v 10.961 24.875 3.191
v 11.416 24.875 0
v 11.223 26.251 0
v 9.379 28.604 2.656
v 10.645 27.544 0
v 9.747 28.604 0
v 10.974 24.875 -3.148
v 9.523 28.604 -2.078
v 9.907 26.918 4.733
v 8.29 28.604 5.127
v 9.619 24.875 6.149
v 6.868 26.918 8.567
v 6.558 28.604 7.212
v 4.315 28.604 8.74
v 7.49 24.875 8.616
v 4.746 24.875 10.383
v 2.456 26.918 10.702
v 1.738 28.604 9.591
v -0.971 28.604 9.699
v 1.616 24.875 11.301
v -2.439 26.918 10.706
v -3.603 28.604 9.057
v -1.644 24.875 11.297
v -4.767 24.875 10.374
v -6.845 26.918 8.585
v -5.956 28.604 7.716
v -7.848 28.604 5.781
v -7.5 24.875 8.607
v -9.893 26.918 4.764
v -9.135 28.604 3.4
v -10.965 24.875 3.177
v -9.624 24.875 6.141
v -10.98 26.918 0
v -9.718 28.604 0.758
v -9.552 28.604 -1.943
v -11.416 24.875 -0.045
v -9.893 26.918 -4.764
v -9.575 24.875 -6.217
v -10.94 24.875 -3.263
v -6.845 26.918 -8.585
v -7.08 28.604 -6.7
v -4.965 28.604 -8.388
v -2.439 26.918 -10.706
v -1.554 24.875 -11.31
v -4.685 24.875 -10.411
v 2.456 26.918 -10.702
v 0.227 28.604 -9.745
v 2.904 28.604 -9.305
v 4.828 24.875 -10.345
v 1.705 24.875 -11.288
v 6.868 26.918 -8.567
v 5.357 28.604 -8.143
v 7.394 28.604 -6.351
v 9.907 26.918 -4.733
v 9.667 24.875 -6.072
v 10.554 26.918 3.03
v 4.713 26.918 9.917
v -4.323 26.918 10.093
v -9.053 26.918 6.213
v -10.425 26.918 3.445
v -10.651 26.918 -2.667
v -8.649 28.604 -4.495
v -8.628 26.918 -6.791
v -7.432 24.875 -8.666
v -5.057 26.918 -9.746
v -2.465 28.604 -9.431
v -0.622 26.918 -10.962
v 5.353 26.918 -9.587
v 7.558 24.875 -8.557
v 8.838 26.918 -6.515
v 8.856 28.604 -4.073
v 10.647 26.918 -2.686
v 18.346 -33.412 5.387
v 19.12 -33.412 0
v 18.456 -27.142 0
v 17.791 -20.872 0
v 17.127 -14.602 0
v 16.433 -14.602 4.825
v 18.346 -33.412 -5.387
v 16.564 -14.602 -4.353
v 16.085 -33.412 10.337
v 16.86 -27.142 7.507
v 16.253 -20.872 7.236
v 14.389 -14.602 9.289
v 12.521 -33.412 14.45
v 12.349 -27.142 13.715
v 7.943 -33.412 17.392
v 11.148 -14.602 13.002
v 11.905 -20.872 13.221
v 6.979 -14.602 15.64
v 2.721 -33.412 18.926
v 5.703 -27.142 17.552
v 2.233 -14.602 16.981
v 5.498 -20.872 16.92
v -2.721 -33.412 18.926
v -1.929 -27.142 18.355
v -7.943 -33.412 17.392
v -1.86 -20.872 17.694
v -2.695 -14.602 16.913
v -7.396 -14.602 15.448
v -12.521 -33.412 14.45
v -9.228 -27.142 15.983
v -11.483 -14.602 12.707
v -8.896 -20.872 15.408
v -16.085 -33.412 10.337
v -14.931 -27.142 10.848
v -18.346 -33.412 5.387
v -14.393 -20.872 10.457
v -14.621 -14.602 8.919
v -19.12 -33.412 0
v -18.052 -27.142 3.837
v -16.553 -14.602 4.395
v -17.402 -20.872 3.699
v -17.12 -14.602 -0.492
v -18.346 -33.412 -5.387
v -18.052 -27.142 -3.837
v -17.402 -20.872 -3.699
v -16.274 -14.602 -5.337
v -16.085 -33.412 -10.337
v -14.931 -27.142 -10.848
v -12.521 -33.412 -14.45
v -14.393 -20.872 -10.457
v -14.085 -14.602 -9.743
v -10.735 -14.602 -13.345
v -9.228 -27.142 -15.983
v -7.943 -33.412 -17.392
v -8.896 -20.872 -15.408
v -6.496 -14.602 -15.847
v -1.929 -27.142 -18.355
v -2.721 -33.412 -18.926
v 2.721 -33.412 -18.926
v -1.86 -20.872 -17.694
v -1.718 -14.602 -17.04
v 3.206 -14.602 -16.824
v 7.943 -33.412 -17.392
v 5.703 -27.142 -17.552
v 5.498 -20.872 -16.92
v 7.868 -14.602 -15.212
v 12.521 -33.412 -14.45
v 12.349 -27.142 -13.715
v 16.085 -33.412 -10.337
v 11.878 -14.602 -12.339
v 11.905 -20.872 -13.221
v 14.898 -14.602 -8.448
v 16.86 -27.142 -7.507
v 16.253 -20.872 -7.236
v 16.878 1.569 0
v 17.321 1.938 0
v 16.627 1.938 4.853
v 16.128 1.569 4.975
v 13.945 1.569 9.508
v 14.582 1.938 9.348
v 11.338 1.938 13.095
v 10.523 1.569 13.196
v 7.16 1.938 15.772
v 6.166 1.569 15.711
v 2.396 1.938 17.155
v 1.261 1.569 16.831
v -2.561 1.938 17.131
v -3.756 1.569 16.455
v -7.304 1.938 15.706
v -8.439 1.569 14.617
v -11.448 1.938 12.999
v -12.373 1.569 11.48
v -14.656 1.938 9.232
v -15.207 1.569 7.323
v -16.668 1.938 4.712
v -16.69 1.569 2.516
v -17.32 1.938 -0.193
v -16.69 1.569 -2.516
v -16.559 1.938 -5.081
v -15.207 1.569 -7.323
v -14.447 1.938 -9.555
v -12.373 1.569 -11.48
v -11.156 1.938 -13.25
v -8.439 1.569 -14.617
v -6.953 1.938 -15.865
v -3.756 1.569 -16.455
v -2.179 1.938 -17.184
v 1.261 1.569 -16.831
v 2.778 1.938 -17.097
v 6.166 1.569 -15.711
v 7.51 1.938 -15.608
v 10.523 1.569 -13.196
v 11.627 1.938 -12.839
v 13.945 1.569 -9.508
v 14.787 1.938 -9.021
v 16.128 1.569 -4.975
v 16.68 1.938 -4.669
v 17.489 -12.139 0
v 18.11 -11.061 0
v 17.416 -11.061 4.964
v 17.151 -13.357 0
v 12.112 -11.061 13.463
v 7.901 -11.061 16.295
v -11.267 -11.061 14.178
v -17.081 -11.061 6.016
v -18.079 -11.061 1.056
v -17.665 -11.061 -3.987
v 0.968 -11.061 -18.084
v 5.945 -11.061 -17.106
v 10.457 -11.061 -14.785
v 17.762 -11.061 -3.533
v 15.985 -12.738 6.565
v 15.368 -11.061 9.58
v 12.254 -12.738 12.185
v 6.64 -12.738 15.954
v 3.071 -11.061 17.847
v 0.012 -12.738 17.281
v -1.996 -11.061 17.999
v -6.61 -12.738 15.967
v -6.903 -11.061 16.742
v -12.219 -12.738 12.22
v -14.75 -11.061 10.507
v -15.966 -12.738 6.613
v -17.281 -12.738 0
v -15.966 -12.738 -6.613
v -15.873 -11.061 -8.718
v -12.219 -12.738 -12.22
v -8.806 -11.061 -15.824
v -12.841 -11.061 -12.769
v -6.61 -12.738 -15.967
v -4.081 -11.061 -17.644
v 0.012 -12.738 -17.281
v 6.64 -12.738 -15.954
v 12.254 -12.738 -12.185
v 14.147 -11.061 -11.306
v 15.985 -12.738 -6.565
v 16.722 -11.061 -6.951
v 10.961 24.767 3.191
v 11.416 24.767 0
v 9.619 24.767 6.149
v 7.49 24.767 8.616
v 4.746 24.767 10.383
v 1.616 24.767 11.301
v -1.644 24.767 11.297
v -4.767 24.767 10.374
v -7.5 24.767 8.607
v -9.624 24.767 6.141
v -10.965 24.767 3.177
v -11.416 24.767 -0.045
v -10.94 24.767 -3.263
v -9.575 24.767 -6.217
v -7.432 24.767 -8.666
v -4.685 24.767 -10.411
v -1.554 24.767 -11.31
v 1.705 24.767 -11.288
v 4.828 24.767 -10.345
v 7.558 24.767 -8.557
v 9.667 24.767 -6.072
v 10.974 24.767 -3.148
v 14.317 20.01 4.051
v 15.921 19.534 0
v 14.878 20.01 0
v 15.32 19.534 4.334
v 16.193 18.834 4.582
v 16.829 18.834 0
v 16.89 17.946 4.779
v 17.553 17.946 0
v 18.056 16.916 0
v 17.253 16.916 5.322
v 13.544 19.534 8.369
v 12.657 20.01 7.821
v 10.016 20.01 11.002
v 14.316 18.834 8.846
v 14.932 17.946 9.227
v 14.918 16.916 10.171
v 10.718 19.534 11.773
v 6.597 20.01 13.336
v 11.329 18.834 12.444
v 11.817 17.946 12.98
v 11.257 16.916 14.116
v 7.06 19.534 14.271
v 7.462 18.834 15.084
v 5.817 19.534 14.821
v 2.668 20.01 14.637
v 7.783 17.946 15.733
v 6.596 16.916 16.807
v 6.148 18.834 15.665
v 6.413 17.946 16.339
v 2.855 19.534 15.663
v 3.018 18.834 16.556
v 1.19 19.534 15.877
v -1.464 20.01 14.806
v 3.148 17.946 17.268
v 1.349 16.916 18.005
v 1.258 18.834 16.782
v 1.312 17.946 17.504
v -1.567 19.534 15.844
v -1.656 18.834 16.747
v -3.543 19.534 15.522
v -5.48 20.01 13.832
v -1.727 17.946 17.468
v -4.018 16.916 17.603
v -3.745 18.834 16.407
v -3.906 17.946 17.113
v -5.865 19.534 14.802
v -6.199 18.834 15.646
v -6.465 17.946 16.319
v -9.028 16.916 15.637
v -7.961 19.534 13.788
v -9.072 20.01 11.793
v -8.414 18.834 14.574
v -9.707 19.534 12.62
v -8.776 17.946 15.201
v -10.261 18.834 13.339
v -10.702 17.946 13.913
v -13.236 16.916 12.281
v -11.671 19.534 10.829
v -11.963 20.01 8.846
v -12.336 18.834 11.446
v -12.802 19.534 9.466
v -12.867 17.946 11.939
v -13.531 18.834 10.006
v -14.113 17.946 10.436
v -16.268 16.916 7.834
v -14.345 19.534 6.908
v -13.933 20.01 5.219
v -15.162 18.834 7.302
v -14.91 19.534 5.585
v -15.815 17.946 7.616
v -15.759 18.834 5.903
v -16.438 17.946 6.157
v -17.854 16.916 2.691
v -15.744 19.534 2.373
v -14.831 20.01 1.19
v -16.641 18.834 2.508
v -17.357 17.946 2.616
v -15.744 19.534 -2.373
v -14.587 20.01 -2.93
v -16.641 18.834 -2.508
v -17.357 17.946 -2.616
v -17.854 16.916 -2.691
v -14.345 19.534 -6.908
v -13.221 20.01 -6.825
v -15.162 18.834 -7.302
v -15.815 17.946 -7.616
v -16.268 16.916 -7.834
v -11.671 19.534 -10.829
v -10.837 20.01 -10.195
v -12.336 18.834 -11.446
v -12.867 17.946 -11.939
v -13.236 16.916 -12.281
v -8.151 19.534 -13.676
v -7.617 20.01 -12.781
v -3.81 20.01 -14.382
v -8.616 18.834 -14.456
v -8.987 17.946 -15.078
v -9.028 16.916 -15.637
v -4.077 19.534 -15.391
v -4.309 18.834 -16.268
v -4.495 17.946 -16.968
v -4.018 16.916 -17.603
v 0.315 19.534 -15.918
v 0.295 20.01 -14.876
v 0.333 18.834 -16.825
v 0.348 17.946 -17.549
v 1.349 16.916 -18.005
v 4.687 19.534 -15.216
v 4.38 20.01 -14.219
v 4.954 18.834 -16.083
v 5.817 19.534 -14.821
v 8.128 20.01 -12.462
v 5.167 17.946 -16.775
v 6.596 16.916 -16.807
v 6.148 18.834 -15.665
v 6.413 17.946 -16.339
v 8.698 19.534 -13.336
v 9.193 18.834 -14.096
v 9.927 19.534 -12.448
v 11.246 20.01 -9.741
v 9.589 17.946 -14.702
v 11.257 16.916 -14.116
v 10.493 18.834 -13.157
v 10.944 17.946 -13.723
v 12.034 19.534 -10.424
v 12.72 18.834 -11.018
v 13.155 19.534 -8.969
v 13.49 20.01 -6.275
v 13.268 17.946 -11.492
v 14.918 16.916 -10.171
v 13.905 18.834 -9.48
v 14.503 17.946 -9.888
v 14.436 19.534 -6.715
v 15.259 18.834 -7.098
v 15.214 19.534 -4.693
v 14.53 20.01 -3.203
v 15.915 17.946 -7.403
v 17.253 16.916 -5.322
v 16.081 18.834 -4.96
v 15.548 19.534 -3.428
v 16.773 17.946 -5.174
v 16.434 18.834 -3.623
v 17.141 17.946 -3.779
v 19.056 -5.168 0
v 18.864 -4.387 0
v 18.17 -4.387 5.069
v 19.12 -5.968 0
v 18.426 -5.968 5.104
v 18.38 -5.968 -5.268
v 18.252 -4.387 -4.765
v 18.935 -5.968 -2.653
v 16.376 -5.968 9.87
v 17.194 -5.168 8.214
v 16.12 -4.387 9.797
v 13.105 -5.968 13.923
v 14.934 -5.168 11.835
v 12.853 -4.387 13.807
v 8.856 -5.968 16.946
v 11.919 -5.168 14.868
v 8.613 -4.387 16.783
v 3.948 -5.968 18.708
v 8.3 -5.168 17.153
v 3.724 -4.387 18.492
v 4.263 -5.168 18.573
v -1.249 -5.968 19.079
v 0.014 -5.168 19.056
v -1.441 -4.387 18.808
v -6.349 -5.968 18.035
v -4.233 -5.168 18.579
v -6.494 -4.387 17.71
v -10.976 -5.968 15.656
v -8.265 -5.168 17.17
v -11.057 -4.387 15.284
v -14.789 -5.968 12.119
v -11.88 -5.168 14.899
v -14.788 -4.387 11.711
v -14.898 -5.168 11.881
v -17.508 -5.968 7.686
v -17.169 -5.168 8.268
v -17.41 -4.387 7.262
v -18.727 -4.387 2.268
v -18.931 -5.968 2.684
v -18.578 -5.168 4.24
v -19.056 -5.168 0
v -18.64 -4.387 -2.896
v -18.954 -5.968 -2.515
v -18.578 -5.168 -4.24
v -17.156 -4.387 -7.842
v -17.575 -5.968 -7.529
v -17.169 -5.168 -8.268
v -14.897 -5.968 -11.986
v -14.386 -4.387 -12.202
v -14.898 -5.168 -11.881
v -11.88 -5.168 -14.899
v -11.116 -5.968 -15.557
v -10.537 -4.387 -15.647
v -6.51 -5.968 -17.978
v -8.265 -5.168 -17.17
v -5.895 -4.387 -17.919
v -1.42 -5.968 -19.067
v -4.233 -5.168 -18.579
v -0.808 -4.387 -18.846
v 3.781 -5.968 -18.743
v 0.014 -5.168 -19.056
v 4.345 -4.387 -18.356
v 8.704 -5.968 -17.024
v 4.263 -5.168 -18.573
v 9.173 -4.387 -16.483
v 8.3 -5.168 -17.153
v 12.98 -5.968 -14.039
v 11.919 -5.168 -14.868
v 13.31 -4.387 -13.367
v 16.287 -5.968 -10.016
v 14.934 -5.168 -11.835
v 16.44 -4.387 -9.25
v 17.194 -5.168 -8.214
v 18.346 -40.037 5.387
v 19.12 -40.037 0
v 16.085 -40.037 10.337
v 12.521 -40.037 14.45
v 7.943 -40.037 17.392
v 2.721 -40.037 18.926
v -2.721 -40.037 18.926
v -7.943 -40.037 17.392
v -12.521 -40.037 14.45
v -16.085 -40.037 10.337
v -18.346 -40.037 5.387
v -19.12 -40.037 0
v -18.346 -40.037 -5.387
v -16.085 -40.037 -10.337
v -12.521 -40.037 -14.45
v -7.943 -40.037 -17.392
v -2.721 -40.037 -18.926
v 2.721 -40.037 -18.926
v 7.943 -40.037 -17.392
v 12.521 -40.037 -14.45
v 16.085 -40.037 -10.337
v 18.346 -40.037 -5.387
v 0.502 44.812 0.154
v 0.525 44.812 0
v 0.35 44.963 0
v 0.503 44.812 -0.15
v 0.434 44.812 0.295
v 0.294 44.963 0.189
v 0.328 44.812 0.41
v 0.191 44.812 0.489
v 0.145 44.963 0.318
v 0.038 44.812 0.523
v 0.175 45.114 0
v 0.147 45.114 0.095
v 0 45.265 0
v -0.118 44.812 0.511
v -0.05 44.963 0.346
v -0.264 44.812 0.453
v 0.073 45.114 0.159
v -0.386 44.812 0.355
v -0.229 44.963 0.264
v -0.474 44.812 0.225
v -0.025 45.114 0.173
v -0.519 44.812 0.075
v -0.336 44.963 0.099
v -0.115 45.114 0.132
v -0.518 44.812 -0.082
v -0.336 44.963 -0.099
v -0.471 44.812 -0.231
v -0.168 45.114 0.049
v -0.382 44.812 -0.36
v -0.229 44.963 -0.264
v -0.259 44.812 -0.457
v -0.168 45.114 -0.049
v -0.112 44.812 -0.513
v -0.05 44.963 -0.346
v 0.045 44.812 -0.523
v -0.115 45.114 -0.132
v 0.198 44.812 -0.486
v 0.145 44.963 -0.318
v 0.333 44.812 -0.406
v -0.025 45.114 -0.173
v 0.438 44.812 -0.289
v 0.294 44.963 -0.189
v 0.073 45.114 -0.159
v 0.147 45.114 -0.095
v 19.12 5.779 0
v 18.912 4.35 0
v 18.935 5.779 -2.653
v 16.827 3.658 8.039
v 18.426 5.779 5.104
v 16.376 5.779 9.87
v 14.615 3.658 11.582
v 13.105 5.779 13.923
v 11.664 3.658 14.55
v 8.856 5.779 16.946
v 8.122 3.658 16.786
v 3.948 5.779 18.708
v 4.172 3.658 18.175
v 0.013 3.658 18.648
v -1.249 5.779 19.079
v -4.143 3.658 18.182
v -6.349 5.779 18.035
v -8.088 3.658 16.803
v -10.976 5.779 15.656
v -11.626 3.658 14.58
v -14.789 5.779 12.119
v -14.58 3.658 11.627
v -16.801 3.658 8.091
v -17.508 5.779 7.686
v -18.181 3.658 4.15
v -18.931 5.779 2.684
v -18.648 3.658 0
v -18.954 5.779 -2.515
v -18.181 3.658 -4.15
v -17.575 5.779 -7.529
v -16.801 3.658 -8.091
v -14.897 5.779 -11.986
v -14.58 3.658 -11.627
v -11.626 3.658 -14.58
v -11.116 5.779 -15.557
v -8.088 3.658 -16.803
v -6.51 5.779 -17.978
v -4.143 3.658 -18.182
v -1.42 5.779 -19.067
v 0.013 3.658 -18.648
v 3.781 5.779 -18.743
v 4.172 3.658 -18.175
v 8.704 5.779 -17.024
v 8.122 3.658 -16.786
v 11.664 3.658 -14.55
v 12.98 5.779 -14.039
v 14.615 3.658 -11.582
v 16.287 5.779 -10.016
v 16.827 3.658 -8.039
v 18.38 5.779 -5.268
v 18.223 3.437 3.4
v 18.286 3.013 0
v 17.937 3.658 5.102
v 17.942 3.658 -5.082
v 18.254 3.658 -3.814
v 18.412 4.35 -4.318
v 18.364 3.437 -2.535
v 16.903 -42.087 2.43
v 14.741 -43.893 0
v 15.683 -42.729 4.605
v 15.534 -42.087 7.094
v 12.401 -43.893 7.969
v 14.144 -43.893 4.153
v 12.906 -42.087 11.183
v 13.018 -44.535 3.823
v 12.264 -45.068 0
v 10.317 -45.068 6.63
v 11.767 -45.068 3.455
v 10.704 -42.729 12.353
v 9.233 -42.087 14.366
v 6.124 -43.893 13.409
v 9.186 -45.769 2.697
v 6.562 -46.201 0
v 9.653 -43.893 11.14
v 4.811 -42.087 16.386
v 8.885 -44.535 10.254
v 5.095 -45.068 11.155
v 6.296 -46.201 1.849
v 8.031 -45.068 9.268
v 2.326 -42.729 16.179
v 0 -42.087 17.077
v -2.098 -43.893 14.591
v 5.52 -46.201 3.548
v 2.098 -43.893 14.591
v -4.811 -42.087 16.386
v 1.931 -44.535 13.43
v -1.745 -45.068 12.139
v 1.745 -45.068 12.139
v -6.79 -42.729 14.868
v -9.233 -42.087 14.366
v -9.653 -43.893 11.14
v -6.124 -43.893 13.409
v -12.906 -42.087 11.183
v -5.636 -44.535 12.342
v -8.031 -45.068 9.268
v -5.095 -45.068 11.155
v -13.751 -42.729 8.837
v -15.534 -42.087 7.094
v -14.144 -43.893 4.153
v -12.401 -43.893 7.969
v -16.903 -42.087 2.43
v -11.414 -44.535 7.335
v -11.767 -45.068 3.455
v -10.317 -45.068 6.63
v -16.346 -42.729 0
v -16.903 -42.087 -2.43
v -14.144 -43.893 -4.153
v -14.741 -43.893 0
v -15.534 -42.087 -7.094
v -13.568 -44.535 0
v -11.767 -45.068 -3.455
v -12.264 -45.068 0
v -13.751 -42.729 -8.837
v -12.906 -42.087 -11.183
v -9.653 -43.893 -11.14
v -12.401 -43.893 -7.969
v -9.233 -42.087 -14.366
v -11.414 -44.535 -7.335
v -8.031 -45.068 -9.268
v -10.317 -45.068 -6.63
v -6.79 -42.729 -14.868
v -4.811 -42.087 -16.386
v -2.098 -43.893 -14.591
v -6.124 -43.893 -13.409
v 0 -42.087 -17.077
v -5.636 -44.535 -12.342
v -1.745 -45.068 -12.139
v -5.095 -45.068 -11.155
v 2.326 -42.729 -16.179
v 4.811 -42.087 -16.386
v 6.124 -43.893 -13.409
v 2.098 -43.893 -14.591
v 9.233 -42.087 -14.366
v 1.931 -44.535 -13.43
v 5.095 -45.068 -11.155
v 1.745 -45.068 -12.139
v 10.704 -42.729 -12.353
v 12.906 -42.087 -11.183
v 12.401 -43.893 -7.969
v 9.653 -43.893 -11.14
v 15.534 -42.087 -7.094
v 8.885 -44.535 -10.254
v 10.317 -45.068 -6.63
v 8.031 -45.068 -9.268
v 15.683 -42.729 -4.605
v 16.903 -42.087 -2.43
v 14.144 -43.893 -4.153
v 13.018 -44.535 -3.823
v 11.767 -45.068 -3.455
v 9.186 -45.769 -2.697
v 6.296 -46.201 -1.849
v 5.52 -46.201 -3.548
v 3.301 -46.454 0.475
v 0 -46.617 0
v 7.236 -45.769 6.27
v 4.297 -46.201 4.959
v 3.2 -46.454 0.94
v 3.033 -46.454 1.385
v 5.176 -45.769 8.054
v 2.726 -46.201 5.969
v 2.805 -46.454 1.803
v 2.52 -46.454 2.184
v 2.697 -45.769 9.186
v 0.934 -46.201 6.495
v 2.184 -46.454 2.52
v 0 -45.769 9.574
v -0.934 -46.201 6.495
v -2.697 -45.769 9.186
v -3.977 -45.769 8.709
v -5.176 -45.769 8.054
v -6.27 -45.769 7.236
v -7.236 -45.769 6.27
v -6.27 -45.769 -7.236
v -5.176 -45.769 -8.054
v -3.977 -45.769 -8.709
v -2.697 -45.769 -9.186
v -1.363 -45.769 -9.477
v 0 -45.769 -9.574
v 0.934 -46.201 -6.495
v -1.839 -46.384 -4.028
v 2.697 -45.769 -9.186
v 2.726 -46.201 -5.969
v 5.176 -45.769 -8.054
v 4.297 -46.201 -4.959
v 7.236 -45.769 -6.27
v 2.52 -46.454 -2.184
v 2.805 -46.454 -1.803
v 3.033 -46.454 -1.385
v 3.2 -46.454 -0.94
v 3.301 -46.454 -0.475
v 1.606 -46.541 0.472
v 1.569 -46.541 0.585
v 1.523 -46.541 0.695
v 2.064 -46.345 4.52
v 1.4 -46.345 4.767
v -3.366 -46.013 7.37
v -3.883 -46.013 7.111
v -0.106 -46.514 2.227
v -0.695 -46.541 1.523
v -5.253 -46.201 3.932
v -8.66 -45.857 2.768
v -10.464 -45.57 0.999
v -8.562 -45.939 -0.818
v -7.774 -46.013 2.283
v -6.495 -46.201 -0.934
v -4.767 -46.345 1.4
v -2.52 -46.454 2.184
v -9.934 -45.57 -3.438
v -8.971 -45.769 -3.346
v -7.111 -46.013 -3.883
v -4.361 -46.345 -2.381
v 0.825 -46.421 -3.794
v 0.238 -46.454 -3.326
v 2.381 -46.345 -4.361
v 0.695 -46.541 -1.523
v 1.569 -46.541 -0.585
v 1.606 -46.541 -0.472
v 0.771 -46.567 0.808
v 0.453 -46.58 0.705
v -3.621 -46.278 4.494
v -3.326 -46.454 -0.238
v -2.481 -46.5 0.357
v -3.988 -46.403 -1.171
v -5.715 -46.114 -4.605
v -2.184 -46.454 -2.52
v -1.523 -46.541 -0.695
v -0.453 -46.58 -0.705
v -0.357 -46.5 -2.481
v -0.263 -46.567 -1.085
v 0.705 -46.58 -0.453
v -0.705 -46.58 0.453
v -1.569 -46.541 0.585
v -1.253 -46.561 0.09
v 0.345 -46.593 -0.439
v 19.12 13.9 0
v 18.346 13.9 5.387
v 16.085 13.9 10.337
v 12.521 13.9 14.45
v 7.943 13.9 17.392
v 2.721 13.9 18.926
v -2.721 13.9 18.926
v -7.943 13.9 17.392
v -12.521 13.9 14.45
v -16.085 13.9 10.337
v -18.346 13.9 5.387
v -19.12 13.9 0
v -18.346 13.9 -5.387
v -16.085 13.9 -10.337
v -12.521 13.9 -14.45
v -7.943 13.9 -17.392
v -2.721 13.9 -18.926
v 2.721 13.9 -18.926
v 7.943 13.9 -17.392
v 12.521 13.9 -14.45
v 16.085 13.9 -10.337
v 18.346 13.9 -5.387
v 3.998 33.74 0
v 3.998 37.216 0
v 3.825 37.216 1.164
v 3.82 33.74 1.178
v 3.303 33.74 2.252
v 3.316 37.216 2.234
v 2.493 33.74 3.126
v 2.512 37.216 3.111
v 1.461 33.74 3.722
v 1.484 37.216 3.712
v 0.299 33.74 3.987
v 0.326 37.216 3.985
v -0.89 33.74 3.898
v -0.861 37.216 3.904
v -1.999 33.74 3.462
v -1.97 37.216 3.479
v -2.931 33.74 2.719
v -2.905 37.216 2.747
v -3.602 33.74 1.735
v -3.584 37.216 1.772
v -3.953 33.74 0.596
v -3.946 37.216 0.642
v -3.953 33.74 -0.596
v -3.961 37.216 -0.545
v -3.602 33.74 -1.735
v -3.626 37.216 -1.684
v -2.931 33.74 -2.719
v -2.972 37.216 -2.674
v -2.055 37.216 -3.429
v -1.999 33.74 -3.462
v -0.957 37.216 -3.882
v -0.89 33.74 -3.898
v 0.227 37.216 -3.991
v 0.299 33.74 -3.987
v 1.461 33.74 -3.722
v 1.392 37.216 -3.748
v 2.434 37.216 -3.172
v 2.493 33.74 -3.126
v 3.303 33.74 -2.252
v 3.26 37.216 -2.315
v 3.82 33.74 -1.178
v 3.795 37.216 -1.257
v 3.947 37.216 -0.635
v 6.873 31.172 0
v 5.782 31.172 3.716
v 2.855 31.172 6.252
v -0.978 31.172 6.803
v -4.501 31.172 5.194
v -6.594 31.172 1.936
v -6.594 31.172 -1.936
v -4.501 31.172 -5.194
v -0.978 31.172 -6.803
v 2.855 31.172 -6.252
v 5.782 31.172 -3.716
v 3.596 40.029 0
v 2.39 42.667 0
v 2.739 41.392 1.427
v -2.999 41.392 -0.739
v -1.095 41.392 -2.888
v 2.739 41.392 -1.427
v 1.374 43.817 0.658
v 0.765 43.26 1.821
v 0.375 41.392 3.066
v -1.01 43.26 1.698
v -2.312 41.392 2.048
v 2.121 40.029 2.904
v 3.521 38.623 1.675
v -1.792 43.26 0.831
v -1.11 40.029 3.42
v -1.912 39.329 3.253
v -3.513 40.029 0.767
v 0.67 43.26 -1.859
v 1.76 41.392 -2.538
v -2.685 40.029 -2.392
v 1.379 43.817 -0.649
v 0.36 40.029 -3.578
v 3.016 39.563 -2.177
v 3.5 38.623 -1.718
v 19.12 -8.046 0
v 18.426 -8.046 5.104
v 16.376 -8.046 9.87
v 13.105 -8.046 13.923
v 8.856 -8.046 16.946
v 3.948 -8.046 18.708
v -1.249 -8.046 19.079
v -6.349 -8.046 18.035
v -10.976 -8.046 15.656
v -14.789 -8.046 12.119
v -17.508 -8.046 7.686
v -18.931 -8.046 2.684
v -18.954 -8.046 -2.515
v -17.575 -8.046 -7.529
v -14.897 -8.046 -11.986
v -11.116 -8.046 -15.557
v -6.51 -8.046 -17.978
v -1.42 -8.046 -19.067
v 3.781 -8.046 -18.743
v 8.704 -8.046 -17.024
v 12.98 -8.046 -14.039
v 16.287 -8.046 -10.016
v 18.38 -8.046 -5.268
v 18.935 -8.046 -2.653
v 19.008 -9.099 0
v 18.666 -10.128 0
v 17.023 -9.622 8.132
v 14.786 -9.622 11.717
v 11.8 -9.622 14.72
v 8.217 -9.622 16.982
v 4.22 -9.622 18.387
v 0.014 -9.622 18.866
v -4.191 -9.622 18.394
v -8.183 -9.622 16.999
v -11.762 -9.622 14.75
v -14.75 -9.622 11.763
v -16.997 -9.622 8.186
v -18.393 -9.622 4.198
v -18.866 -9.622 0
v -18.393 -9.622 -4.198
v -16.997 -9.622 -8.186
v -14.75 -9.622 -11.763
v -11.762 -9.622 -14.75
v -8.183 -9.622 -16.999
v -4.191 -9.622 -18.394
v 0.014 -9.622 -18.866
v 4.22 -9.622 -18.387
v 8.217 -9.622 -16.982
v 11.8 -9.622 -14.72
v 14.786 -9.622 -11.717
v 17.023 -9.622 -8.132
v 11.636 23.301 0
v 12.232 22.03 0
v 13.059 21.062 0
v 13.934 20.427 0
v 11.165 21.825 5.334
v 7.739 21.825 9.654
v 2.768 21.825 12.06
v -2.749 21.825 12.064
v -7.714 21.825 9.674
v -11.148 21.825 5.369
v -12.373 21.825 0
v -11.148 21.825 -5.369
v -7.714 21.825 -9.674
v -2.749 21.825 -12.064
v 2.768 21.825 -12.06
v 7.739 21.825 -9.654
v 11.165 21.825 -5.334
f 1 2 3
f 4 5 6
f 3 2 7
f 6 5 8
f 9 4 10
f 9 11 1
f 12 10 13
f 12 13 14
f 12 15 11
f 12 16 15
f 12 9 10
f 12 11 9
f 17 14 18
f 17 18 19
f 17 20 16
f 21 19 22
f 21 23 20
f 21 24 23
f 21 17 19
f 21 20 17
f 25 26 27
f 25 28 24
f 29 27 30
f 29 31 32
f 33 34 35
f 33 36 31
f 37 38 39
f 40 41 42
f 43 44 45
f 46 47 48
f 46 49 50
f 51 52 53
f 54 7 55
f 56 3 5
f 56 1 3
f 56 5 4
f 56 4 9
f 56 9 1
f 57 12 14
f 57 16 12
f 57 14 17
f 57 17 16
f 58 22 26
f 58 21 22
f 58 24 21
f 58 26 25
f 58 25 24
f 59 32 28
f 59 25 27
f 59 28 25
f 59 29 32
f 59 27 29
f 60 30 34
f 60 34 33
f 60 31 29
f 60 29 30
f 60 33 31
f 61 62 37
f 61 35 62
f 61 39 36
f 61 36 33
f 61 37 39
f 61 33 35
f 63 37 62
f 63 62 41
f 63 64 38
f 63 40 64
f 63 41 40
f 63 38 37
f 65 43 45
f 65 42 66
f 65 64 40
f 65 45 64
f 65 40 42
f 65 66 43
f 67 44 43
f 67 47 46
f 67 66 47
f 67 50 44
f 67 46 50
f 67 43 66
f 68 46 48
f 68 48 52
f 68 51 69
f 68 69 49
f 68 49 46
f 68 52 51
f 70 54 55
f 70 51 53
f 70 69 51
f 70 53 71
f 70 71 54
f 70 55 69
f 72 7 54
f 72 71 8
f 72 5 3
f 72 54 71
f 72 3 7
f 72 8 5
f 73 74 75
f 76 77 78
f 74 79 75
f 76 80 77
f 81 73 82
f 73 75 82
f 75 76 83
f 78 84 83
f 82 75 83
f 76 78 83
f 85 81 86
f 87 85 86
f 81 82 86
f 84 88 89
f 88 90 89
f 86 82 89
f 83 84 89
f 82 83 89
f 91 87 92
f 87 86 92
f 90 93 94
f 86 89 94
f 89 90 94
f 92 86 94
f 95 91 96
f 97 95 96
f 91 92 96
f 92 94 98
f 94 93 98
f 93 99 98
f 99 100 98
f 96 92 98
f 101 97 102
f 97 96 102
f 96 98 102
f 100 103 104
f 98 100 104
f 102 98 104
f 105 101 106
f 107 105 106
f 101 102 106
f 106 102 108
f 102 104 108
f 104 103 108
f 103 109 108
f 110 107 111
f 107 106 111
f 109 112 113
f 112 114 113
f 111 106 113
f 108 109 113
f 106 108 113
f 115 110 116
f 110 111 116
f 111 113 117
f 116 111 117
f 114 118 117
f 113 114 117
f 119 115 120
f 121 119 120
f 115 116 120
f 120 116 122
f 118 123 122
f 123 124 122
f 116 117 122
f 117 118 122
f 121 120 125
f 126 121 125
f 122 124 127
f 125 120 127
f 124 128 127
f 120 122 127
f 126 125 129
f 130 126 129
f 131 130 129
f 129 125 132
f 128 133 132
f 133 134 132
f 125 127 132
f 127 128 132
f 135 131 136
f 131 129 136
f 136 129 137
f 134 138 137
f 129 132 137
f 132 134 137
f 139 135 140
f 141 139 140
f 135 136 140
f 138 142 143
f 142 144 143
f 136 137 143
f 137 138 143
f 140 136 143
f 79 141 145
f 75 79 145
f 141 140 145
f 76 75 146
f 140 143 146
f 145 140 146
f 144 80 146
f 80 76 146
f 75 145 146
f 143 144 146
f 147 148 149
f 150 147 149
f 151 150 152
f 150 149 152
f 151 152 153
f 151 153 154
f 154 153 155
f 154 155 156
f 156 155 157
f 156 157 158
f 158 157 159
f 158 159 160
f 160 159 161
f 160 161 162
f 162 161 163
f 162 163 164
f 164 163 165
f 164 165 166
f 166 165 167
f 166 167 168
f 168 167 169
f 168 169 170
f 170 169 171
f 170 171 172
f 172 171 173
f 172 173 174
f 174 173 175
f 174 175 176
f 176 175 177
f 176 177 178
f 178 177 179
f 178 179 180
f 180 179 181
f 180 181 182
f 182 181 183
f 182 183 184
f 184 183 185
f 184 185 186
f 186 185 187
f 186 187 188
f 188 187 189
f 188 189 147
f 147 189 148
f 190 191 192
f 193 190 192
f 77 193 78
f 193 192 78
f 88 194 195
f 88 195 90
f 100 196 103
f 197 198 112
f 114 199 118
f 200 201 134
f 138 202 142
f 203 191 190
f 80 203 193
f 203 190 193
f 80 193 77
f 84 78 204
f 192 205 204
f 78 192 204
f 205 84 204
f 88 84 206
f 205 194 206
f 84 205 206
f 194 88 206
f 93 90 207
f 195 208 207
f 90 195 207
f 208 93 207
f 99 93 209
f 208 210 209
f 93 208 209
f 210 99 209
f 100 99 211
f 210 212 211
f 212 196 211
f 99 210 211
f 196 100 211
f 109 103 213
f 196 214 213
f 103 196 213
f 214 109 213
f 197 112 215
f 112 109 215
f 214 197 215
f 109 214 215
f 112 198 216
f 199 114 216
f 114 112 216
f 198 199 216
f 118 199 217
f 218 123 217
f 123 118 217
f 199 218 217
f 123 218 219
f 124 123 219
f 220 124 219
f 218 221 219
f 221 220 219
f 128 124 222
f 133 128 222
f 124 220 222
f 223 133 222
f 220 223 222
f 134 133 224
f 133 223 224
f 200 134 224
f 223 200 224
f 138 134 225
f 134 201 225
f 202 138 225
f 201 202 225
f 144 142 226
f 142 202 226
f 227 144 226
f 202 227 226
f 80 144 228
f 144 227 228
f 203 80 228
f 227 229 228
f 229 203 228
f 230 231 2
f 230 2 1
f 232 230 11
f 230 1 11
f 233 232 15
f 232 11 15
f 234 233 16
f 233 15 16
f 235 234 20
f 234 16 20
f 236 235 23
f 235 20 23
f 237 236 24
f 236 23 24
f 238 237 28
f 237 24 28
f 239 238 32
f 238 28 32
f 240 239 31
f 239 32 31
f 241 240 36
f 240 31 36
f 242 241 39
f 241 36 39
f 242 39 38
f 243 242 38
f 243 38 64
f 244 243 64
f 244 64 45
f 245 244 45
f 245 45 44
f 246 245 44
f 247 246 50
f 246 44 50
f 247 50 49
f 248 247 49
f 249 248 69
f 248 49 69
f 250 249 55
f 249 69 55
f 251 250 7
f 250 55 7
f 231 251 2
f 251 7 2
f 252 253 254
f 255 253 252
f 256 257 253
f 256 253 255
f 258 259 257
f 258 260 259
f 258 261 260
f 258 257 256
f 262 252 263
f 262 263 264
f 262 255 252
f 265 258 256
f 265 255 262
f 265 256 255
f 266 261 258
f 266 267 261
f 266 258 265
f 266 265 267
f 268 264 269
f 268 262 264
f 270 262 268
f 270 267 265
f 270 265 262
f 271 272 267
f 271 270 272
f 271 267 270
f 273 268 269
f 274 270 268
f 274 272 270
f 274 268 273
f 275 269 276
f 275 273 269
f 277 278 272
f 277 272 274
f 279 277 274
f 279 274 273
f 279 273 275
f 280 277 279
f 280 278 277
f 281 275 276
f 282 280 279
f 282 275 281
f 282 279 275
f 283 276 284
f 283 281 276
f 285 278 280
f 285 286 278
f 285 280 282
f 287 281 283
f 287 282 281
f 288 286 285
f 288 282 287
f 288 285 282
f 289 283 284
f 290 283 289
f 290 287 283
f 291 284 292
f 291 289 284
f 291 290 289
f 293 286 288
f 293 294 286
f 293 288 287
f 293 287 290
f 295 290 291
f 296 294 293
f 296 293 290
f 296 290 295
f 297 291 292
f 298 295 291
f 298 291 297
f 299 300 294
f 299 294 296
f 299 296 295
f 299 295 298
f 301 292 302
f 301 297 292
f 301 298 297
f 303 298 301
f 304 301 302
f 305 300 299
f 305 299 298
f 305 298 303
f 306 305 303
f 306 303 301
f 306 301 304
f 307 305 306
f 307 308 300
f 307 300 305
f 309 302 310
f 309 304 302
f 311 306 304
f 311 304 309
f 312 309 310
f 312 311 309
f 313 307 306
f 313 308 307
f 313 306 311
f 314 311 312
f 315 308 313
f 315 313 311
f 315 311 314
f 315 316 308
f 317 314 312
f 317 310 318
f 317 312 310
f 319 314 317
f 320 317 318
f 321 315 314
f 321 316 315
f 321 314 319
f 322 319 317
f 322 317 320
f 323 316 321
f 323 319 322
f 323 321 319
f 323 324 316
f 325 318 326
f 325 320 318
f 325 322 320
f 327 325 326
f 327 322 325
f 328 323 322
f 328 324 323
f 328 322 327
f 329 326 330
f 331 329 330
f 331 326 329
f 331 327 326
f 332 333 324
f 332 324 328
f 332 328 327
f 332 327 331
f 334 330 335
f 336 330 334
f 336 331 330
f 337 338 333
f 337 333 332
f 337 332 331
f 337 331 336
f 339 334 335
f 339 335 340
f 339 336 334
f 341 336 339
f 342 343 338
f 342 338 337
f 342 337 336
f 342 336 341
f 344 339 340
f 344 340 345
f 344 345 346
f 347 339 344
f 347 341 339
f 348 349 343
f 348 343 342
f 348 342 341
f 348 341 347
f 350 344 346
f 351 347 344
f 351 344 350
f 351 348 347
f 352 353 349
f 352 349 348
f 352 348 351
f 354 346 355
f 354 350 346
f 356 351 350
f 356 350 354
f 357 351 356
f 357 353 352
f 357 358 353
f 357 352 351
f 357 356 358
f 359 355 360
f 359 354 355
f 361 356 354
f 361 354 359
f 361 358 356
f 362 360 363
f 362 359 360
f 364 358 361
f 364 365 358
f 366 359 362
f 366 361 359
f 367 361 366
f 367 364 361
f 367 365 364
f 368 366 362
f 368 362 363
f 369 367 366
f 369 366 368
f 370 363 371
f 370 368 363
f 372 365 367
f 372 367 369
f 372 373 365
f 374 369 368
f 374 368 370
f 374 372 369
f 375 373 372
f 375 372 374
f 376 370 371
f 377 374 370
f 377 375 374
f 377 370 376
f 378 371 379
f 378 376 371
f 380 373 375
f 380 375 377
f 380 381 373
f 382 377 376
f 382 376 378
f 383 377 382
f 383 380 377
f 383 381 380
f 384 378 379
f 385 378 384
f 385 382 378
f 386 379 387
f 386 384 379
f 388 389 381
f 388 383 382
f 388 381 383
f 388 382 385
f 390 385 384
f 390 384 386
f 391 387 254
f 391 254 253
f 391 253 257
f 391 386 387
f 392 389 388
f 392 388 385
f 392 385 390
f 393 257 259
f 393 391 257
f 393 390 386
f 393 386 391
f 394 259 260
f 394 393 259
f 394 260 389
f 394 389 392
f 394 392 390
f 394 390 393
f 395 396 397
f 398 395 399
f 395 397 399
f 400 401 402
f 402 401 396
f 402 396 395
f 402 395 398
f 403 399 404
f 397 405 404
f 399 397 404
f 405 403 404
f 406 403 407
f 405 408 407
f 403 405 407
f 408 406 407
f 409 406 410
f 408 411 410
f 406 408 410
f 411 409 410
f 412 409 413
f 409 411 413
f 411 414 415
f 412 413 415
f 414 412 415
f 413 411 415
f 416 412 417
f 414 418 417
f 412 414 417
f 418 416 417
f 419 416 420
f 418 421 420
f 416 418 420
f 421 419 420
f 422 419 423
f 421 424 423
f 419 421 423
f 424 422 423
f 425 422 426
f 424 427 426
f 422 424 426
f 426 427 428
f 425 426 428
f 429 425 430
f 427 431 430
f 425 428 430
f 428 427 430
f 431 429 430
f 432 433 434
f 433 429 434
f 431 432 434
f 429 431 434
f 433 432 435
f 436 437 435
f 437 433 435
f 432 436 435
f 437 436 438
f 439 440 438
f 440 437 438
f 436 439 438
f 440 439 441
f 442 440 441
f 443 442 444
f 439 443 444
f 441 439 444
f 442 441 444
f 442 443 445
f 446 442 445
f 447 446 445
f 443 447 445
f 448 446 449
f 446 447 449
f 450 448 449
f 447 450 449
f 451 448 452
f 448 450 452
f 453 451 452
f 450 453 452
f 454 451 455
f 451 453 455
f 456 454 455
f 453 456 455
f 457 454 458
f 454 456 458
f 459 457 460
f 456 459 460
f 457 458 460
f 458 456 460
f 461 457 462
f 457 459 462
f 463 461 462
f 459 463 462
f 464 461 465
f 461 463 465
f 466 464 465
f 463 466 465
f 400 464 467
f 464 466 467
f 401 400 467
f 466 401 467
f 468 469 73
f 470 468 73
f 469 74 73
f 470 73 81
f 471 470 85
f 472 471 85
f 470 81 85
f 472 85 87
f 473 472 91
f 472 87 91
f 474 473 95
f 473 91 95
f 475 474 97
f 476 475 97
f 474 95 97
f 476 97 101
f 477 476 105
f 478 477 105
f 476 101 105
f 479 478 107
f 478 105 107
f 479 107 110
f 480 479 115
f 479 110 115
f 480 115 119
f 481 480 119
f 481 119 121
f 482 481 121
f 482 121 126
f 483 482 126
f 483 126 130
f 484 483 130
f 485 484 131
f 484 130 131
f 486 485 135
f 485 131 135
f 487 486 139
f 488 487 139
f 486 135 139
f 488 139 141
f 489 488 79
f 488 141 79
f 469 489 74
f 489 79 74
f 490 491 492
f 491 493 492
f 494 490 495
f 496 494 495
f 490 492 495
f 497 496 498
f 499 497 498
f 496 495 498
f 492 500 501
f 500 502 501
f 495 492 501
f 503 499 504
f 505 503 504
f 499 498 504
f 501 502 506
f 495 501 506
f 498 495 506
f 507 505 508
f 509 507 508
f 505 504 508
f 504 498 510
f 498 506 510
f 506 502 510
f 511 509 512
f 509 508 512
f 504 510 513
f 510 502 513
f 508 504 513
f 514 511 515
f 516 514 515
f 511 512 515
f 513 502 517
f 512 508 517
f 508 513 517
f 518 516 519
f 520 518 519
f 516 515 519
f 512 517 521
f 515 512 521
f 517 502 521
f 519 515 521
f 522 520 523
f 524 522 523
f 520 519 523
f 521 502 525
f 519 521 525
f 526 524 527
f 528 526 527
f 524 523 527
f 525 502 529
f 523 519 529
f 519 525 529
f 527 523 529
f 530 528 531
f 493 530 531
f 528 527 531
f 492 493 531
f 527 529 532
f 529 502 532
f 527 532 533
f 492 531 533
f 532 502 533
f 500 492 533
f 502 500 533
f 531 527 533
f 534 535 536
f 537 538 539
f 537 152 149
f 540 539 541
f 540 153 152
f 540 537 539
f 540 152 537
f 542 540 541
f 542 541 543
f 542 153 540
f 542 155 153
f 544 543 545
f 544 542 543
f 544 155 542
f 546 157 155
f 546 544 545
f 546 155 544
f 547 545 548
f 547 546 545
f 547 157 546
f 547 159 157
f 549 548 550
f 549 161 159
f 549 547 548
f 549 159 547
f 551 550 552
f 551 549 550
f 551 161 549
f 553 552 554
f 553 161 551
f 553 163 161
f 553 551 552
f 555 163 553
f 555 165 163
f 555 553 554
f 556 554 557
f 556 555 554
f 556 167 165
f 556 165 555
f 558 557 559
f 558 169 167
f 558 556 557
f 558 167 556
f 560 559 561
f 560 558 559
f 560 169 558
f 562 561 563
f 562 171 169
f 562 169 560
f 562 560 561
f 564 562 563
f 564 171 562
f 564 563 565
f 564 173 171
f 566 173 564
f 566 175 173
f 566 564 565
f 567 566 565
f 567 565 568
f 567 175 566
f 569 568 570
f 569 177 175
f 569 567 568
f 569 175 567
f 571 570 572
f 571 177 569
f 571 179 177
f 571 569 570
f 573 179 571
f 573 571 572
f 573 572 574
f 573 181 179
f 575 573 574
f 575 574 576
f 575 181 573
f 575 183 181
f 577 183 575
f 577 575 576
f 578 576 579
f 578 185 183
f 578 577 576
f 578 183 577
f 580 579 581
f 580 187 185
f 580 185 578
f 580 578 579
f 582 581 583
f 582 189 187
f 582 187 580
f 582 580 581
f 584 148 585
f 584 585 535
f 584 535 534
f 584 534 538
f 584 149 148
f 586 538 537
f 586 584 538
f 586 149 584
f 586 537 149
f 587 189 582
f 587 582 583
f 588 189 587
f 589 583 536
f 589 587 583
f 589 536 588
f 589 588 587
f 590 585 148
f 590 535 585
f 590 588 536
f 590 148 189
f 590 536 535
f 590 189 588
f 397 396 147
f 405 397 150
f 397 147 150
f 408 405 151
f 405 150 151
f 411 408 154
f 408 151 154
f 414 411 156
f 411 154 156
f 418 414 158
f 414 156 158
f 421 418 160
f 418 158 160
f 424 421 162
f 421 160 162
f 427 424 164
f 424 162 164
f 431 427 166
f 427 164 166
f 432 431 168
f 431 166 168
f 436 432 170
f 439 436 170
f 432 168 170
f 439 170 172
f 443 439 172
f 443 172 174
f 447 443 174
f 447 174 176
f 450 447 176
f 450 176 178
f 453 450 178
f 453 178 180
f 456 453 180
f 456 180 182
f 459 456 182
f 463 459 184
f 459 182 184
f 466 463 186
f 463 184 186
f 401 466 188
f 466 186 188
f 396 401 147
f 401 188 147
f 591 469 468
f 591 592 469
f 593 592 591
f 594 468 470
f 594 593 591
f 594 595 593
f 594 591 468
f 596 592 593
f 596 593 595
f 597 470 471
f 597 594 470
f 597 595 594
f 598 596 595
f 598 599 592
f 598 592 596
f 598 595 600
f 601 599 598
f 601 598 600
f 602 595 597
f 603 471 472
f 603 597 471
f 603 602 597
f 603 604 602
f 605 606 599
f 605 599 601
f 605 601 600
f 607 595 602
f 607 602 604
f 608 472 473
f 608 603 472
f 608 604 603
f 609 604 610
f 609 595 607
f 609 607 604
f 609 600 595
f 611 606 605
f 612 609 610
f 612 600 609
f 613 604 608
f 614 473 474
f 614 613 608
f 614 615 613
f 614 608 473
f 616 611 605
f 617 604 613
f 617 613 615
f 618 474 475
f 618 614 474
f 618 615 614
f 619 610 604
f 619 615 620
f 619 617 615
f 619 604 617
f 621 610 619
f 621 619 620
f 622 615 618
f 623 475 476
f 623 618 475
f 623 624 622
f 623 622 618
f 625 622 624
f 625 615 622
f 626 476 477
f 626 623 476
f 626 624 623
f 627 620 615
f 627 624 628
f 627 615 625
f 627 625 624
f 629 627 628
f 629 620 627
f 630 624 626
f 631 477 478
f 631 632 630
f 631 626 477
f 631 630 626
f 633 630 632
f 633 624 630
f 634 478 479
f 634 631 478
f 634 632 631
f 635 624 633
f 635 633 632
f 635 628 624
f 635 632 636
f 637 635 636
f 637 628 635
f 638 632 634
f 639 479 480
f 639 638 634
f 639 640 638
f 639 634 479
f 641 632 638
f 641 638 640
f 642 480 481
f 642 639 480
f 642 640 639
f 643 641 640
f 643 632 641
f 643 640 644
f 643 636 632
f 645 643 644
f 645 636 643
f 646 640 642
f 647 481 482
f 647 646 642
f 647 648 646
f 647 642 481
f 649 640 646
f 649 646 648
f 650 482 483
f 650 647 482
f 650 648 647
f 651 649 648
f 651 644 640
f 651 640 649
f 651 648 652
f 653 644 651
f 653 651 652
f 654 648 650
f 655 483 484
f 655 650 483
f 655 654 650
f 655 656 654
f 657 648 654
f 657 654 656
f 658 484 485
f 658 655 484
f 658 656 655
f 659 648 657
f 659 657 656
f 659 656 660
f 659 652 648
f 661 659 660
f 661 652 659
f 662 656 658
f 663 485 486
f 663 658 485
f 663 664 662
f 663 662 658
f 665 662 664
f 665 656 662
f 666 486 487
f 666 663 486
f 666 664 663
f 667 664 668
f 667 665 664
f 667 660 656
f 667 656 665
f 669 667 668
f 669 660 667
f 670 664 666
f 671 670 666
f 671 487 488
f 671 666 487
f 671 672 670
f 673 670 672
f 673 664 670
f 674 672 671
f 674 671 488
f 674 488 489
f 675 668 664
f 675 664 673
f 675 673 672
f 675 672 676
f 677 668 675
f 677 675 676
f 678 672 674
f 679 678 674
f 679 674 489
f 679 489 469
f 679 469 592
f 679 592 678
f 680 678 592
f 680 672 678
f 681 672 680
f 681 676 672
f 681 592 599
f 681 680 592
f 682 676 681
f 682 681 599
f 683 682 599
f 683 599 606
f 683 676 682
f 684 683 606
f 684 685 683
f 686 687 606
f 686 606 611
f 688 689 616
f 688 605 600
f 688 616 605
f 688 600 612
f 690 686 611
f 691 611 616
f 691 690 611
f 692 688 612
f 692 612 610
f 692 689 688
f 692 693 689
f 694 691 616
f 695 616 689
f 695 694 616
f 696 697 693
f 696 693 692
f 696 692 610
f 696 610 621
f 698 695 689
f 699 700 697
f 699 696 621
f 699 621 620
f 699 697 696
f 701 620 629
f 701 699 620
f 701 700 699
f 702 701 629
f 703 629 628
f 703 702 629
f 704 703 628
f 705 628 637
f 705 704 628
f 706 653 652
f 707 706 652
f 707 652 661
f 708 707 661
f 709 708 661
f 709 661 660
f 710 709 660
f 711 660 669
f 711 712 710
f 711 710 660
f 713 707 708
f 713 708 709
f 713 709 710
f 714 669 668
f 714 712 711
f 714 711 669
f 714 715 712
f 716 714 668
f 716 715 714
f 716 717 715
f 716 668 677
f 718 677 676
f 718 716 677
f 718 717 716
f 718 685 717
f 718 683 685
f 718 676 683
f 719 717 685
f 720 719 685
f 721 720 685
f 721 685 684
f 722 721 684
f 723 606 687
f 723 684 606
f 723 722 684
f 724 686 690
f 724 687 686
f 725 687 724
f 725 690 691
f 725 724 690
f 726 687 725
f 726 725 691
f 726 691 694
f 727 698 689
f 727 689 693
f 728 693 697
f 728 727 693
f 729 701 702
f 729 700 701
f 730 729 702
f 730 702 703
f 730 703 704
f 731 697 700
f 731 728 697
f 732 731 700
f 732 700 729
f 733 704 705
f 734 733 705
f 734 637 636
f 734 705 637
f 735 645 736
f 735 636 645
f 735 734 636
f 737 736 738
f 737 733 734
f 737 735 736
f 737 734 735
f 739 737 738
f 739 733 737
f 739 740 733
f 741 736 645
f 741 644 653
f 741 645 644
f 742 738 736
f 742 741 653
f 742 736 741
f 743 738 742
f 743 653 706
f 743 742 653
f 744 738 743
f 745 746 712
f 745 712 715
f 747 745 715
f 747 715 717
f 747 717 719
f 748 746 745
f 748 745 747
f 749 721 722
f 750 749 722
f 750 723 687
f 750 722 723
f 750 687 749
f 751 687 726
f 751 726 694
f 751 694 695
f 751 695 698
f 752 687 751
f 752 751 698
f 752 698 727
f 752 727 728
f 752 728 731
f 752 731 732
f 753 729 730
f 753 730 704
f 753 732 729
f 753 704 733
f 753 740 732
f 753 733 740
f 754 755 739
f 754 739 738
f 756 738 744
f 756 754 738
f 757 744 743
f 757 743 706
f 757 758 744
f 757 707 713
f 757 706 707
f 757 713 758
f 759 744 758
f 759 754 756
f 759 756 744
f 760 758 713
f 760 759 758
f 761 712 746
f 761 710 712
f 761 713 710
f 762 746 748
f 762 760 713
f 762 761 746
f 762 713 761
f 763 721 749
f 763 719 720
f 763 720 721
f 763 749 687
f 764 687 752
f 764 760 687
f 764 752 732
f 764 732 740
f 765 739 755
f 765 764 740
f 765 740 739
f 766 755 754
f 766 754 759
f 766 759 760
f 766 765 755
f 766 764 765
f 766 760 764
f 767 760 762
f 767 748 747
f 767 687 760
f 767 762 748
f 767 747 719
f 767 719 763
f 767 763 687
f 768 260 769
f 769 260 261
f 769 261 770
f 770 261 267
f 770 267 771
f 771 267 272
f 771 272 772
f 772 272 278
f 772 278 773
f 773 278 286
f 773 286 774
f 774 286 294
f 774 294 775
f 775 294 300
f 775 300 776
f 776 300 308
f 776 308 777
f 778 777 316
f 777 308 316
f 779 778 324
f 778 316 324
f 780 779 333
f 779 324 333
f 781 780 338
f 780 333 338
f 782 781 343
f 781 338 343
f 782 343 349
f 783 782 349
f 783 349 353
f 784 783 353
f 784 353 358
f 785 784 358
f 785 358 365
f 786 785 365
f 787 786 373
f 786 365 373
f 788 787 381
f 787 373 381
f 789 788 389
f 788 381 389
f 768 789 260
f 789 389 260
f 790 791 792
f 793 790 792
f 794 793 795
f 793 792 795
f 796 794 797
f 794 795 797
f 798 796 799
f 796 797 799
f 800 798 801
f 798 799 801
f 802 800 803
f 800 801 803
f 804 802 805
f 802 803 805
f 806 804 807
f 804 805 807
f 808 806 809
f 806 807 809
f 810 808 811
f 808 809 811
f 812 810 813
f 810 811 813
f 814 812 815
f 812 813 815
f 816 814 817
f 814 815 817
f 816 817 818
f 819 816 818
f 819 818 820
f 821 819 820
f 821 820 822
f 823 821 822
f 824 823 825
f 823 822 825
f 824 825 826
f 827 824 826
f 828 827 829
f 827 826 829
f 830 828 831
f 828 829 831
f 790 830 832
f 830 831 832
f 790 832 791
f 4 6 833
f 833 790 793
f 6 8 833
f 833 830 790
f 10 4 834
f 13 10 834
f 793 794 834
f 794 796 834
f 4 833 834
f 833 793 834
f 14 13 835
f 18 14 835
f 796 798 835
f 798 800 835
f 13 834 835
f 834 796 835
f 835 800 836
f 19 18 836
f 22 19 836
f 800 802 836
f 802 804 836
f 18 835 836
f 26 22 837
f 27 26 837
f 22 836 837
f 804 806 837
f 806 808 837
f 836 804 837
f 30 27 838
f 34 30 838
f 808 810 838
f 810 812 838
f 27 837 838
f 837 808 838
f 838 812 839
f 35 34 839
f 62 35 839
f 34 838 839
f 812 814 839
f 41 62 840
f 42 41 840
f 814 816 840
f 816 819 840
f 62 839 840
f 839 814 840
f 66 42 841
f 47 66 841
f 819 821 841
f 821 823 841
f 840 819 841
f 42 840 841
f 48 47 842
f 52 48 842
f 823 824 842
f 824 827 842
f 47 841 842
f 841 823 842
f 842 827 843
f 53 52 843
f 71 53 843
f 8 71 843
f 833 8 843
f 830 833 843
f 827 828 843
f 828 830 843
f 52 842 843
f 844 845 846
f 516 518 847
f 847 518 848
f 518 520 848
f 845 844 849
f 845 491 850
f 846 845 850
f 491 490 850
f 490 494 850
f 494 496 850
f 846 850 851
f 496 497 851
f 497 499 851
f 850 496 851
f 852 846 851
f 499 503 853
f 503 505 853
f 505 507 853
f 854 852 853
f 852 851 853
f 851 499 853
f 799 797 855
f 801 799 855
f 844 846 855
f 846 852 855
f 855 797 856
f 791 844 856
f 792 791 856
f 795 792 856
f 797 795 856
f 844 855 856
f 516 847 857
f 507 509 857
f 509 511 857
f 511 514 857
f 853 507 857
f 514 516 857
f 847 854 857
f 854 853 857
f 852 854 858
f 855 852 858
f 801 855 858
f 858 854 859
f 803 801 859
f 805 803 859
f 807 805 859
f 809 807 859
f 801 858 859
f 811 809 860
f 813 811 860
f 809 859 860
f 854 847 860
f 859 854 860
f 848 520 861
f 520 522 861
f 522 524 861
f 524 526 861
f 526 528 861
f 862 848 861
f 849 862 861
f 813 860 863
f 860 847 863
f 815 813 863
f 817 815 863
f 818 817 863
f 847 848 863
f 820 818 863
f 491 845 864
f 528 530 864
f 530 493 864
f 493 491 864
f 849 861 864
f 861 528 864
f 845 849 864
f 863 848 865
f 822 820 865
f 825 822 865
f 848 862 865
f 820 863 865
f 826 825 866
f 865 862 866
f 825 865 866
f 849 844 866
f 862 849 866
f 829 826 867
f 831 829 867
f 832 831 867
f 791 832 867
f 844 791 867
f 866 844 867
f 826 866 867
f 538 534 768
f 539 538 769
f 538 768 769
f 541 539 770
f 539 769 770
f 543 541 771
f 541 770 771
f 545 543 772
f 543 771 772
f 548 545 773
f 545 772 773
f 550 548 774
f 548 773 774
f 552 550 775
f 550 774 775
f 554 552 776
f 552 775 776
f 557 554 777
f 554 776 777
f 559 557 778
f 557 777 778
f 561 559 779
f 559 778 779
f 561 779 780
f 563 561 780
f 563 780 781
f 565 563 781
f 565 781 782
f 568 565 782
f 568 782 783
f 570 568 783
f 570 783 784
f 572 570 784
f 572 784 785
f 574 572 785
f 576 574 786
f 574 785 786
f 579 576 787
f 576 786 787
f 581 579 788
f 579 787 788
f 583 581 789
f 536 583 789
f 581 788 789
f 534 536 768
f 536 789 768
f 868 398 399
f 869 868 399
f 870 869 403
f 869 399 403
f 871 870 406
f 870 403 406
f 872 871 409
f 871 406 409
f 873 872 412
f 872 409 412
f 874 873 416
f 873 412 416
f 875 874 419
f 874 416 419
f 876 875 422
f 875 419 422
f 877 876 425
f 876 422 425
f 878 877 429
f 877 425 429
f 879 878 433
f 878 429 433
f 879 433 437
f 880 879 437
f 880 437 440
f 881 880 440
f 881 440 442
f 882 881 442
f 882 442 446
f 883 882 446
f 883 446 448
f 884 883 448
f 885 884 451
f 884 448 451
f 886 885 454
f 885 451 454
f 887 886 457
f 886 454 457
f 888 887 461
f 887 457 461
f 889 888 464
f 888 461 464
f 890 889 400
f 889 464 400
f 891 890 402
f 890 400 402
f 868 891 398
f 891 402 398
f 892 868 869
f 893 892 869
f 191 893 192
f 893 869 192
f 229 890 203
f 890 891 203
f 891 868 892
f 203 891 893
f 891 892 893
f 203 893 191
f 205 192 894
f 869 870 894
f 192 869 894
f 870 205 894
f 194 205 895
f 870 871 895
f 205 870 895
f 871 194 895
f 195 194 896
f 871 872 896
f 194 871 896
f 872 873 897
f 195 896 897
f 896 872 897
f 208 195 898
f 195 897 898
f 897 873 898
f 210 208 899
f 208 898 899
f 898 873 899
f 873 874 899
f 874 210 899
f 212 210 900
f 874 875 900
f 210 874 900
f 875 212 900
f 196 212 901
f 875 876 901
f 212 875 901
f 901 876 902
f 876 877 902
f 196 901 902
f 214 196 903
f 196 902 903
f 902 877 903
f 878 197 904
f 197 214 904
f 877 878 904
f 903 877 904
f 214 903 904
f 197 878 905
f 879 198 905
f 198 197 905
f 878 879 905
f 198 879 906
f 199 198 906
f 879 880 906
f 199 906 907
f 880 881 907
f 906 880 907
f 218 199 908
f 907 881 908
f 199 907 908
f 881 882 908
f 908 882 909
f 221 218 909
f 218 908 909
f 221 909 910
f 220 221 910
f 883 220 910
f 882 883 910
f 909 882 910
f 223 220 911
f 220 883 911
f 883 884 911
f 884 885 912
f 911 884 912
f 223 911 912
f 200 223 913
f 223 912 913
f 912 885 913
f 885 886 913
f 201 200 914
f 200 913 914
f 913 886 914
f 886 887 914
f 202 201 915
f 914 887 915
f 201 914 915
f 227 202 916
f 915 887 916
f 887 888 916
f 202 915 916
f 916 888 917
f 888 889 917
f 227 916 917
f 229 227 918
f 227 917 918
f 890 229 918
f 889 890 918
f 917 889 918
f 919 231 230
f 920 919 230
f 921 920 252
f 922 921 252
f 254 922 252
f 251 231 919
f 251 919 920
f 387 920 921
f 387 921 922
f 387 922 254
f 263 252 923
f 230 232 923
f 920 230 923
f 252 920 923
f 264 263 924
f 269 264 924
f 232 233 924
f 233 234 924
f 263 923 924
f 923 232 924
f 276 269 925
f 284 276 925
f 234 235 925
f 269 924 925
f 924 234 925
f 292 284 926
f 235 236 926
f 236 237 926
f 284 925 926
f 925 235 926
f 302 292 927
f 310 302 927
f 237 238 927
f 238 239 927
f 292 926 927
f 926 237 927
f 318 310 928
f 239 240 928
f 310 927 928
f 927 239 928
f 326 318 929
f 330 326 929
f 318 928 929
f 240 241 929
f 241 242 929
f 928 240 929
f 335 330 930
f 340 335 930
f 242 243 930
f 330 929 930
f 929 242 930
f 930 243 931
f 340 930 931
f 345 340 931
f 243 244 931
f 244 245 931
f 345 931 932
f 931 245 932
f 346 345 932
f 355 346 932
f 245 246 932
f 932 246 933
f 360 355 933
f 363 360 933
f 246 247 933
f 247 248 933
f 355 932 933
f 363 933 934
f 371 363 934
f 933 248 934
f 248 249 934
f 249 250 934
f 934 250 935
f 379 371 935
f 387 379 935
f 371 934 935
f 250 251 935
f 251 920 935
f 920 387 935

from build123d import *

# Parameters (mm, degrees)
F2_R = 10.0418427949
F3_R = 5
F4_R = 5
F5_R = 5
F6_R = 5
F7_R = 5
F8_R = 5
F9_R = 5


with BuildPart() as f1:
    # F0 (on Top) → F1 (revolve)
    with BuildSketch(Plane.XY):
        with BuildLine():
            Line((3.9978994305, 41.8078787625), (0, 45.2654622495))
            Line((0, 45.2654622495), (0, -46.6173030436))
            add(Edge.make_bspline(
                [(19.1201921552, -40.0373525918), (17.3987358712, -41.8425355299), (13.410823789, -46.0244081204), (4.8598099626, -46.4024499742), (0, -46.6173030436)],
                knots=[0, 0, 0, 0, 0.4316685645, 1, 1, 1, 1], degree=3))
            Line((19.1201921552, -40.0373525918), (19.1201921552, -33.4124453366))
            Line((19.1201921552, -33.4124453366), (16.8782249093, -12.2566334903))
            Line((16.8782249093, -12.2566334903), (19.1201921552, -10.3883286938))
            Line((19.1201921552, -10.3883286938), (19.1201921552, -5.157073494))
            Line((19.1201921552, -5.157073494), (16.8782249093, 1.5688246349))
            Line((16.8782249093, 1.5688246349), (19.1201921552, 3.4371297807))
            Line((19.1201921552, 3.4371297807), (19.1201921552, 10.910349898))
            Line((19.1201921552, 10.910349898), (19.1201921552, 13.8996383175))
            Line((19.1201921552, 13.8996383175), (16.8782249093, 20.2518757433))
            Line((16.8782249093, 20.2518757433), (11.4163085818, 20.2518757433))
            Line((11.4163085818, 20.2518757433), (11.4163085818, 22.2149007022))
            Line((11.4163085818, 22.2149007022), (11.4163085818, 27.1131433547))
            Line((11.4163085818, 27.1131433547), (3.9978994305, 33.7401814759))
            Line((3.9978994305, 33.7401814759), (3.9978994305, 41.8078787625))
        make_face()
    revolve(axis=Axis((0, -0.675920397, 0), (0, -1, 0)))

    # F2
    f2_edges = [f1.edges().sort_by_distance(p)[0] for p in [
        (-3.997899, 41.807879, 0),
        (1.99895, 43.536671, 0),
    ]]
    fillet(f2_edges, radius=F2_R)

    # F3
    f3_edges = [f1.edges().sort_by_distance(p)[0] for p in [
        (-16.878225, 20.251876, 0),
    ]]
    fillet(f3_edges, radius=F3_R)

    # F4
    f4_edges = [f1.edges().sort_by_distance(p)[0] for p in [
        (-19.120192, -5.157073, 0),
    ]]
    fillet(f4_edges, radius=F4_R)

    # F5
    f5_edges = [f1.edges().sort_by_distance(p)[0] for p in [
        (-11.416309, 27.113143, 0),
    ]]
    fillet(f5_edges, radius=F5_R)

    # F6
    f6_edges = [f1.edges().sort_by_distance(p)[0] for p in [
        (-11.416309, 20.251876, 0),
    ]]
    fillet(f6_edges, radius=F6_R)

    # F7
    f7_edges = [f1.edges().sort_by_distance(p)[0] for p in [
        (-19.120192, -10.388329, 0),
    ]]
    fillet(f7_edges, radius=F7_R)

    # F8
    f8_edges = [f1.edges().sort_by_distance(p)[0] for p in [
        (-16.878225, -12.256633, 0),
    ]]
    fillet(f8_edges, radius=F8_R)

    # F9
    f9_edges = [f1.edges().sort_by_distance(p)[0] for p in [
        (-19.120192, 3.43713, 0),
    ]]
    fillet(f9_edges, radius=F9_R)


solid = f1.part
